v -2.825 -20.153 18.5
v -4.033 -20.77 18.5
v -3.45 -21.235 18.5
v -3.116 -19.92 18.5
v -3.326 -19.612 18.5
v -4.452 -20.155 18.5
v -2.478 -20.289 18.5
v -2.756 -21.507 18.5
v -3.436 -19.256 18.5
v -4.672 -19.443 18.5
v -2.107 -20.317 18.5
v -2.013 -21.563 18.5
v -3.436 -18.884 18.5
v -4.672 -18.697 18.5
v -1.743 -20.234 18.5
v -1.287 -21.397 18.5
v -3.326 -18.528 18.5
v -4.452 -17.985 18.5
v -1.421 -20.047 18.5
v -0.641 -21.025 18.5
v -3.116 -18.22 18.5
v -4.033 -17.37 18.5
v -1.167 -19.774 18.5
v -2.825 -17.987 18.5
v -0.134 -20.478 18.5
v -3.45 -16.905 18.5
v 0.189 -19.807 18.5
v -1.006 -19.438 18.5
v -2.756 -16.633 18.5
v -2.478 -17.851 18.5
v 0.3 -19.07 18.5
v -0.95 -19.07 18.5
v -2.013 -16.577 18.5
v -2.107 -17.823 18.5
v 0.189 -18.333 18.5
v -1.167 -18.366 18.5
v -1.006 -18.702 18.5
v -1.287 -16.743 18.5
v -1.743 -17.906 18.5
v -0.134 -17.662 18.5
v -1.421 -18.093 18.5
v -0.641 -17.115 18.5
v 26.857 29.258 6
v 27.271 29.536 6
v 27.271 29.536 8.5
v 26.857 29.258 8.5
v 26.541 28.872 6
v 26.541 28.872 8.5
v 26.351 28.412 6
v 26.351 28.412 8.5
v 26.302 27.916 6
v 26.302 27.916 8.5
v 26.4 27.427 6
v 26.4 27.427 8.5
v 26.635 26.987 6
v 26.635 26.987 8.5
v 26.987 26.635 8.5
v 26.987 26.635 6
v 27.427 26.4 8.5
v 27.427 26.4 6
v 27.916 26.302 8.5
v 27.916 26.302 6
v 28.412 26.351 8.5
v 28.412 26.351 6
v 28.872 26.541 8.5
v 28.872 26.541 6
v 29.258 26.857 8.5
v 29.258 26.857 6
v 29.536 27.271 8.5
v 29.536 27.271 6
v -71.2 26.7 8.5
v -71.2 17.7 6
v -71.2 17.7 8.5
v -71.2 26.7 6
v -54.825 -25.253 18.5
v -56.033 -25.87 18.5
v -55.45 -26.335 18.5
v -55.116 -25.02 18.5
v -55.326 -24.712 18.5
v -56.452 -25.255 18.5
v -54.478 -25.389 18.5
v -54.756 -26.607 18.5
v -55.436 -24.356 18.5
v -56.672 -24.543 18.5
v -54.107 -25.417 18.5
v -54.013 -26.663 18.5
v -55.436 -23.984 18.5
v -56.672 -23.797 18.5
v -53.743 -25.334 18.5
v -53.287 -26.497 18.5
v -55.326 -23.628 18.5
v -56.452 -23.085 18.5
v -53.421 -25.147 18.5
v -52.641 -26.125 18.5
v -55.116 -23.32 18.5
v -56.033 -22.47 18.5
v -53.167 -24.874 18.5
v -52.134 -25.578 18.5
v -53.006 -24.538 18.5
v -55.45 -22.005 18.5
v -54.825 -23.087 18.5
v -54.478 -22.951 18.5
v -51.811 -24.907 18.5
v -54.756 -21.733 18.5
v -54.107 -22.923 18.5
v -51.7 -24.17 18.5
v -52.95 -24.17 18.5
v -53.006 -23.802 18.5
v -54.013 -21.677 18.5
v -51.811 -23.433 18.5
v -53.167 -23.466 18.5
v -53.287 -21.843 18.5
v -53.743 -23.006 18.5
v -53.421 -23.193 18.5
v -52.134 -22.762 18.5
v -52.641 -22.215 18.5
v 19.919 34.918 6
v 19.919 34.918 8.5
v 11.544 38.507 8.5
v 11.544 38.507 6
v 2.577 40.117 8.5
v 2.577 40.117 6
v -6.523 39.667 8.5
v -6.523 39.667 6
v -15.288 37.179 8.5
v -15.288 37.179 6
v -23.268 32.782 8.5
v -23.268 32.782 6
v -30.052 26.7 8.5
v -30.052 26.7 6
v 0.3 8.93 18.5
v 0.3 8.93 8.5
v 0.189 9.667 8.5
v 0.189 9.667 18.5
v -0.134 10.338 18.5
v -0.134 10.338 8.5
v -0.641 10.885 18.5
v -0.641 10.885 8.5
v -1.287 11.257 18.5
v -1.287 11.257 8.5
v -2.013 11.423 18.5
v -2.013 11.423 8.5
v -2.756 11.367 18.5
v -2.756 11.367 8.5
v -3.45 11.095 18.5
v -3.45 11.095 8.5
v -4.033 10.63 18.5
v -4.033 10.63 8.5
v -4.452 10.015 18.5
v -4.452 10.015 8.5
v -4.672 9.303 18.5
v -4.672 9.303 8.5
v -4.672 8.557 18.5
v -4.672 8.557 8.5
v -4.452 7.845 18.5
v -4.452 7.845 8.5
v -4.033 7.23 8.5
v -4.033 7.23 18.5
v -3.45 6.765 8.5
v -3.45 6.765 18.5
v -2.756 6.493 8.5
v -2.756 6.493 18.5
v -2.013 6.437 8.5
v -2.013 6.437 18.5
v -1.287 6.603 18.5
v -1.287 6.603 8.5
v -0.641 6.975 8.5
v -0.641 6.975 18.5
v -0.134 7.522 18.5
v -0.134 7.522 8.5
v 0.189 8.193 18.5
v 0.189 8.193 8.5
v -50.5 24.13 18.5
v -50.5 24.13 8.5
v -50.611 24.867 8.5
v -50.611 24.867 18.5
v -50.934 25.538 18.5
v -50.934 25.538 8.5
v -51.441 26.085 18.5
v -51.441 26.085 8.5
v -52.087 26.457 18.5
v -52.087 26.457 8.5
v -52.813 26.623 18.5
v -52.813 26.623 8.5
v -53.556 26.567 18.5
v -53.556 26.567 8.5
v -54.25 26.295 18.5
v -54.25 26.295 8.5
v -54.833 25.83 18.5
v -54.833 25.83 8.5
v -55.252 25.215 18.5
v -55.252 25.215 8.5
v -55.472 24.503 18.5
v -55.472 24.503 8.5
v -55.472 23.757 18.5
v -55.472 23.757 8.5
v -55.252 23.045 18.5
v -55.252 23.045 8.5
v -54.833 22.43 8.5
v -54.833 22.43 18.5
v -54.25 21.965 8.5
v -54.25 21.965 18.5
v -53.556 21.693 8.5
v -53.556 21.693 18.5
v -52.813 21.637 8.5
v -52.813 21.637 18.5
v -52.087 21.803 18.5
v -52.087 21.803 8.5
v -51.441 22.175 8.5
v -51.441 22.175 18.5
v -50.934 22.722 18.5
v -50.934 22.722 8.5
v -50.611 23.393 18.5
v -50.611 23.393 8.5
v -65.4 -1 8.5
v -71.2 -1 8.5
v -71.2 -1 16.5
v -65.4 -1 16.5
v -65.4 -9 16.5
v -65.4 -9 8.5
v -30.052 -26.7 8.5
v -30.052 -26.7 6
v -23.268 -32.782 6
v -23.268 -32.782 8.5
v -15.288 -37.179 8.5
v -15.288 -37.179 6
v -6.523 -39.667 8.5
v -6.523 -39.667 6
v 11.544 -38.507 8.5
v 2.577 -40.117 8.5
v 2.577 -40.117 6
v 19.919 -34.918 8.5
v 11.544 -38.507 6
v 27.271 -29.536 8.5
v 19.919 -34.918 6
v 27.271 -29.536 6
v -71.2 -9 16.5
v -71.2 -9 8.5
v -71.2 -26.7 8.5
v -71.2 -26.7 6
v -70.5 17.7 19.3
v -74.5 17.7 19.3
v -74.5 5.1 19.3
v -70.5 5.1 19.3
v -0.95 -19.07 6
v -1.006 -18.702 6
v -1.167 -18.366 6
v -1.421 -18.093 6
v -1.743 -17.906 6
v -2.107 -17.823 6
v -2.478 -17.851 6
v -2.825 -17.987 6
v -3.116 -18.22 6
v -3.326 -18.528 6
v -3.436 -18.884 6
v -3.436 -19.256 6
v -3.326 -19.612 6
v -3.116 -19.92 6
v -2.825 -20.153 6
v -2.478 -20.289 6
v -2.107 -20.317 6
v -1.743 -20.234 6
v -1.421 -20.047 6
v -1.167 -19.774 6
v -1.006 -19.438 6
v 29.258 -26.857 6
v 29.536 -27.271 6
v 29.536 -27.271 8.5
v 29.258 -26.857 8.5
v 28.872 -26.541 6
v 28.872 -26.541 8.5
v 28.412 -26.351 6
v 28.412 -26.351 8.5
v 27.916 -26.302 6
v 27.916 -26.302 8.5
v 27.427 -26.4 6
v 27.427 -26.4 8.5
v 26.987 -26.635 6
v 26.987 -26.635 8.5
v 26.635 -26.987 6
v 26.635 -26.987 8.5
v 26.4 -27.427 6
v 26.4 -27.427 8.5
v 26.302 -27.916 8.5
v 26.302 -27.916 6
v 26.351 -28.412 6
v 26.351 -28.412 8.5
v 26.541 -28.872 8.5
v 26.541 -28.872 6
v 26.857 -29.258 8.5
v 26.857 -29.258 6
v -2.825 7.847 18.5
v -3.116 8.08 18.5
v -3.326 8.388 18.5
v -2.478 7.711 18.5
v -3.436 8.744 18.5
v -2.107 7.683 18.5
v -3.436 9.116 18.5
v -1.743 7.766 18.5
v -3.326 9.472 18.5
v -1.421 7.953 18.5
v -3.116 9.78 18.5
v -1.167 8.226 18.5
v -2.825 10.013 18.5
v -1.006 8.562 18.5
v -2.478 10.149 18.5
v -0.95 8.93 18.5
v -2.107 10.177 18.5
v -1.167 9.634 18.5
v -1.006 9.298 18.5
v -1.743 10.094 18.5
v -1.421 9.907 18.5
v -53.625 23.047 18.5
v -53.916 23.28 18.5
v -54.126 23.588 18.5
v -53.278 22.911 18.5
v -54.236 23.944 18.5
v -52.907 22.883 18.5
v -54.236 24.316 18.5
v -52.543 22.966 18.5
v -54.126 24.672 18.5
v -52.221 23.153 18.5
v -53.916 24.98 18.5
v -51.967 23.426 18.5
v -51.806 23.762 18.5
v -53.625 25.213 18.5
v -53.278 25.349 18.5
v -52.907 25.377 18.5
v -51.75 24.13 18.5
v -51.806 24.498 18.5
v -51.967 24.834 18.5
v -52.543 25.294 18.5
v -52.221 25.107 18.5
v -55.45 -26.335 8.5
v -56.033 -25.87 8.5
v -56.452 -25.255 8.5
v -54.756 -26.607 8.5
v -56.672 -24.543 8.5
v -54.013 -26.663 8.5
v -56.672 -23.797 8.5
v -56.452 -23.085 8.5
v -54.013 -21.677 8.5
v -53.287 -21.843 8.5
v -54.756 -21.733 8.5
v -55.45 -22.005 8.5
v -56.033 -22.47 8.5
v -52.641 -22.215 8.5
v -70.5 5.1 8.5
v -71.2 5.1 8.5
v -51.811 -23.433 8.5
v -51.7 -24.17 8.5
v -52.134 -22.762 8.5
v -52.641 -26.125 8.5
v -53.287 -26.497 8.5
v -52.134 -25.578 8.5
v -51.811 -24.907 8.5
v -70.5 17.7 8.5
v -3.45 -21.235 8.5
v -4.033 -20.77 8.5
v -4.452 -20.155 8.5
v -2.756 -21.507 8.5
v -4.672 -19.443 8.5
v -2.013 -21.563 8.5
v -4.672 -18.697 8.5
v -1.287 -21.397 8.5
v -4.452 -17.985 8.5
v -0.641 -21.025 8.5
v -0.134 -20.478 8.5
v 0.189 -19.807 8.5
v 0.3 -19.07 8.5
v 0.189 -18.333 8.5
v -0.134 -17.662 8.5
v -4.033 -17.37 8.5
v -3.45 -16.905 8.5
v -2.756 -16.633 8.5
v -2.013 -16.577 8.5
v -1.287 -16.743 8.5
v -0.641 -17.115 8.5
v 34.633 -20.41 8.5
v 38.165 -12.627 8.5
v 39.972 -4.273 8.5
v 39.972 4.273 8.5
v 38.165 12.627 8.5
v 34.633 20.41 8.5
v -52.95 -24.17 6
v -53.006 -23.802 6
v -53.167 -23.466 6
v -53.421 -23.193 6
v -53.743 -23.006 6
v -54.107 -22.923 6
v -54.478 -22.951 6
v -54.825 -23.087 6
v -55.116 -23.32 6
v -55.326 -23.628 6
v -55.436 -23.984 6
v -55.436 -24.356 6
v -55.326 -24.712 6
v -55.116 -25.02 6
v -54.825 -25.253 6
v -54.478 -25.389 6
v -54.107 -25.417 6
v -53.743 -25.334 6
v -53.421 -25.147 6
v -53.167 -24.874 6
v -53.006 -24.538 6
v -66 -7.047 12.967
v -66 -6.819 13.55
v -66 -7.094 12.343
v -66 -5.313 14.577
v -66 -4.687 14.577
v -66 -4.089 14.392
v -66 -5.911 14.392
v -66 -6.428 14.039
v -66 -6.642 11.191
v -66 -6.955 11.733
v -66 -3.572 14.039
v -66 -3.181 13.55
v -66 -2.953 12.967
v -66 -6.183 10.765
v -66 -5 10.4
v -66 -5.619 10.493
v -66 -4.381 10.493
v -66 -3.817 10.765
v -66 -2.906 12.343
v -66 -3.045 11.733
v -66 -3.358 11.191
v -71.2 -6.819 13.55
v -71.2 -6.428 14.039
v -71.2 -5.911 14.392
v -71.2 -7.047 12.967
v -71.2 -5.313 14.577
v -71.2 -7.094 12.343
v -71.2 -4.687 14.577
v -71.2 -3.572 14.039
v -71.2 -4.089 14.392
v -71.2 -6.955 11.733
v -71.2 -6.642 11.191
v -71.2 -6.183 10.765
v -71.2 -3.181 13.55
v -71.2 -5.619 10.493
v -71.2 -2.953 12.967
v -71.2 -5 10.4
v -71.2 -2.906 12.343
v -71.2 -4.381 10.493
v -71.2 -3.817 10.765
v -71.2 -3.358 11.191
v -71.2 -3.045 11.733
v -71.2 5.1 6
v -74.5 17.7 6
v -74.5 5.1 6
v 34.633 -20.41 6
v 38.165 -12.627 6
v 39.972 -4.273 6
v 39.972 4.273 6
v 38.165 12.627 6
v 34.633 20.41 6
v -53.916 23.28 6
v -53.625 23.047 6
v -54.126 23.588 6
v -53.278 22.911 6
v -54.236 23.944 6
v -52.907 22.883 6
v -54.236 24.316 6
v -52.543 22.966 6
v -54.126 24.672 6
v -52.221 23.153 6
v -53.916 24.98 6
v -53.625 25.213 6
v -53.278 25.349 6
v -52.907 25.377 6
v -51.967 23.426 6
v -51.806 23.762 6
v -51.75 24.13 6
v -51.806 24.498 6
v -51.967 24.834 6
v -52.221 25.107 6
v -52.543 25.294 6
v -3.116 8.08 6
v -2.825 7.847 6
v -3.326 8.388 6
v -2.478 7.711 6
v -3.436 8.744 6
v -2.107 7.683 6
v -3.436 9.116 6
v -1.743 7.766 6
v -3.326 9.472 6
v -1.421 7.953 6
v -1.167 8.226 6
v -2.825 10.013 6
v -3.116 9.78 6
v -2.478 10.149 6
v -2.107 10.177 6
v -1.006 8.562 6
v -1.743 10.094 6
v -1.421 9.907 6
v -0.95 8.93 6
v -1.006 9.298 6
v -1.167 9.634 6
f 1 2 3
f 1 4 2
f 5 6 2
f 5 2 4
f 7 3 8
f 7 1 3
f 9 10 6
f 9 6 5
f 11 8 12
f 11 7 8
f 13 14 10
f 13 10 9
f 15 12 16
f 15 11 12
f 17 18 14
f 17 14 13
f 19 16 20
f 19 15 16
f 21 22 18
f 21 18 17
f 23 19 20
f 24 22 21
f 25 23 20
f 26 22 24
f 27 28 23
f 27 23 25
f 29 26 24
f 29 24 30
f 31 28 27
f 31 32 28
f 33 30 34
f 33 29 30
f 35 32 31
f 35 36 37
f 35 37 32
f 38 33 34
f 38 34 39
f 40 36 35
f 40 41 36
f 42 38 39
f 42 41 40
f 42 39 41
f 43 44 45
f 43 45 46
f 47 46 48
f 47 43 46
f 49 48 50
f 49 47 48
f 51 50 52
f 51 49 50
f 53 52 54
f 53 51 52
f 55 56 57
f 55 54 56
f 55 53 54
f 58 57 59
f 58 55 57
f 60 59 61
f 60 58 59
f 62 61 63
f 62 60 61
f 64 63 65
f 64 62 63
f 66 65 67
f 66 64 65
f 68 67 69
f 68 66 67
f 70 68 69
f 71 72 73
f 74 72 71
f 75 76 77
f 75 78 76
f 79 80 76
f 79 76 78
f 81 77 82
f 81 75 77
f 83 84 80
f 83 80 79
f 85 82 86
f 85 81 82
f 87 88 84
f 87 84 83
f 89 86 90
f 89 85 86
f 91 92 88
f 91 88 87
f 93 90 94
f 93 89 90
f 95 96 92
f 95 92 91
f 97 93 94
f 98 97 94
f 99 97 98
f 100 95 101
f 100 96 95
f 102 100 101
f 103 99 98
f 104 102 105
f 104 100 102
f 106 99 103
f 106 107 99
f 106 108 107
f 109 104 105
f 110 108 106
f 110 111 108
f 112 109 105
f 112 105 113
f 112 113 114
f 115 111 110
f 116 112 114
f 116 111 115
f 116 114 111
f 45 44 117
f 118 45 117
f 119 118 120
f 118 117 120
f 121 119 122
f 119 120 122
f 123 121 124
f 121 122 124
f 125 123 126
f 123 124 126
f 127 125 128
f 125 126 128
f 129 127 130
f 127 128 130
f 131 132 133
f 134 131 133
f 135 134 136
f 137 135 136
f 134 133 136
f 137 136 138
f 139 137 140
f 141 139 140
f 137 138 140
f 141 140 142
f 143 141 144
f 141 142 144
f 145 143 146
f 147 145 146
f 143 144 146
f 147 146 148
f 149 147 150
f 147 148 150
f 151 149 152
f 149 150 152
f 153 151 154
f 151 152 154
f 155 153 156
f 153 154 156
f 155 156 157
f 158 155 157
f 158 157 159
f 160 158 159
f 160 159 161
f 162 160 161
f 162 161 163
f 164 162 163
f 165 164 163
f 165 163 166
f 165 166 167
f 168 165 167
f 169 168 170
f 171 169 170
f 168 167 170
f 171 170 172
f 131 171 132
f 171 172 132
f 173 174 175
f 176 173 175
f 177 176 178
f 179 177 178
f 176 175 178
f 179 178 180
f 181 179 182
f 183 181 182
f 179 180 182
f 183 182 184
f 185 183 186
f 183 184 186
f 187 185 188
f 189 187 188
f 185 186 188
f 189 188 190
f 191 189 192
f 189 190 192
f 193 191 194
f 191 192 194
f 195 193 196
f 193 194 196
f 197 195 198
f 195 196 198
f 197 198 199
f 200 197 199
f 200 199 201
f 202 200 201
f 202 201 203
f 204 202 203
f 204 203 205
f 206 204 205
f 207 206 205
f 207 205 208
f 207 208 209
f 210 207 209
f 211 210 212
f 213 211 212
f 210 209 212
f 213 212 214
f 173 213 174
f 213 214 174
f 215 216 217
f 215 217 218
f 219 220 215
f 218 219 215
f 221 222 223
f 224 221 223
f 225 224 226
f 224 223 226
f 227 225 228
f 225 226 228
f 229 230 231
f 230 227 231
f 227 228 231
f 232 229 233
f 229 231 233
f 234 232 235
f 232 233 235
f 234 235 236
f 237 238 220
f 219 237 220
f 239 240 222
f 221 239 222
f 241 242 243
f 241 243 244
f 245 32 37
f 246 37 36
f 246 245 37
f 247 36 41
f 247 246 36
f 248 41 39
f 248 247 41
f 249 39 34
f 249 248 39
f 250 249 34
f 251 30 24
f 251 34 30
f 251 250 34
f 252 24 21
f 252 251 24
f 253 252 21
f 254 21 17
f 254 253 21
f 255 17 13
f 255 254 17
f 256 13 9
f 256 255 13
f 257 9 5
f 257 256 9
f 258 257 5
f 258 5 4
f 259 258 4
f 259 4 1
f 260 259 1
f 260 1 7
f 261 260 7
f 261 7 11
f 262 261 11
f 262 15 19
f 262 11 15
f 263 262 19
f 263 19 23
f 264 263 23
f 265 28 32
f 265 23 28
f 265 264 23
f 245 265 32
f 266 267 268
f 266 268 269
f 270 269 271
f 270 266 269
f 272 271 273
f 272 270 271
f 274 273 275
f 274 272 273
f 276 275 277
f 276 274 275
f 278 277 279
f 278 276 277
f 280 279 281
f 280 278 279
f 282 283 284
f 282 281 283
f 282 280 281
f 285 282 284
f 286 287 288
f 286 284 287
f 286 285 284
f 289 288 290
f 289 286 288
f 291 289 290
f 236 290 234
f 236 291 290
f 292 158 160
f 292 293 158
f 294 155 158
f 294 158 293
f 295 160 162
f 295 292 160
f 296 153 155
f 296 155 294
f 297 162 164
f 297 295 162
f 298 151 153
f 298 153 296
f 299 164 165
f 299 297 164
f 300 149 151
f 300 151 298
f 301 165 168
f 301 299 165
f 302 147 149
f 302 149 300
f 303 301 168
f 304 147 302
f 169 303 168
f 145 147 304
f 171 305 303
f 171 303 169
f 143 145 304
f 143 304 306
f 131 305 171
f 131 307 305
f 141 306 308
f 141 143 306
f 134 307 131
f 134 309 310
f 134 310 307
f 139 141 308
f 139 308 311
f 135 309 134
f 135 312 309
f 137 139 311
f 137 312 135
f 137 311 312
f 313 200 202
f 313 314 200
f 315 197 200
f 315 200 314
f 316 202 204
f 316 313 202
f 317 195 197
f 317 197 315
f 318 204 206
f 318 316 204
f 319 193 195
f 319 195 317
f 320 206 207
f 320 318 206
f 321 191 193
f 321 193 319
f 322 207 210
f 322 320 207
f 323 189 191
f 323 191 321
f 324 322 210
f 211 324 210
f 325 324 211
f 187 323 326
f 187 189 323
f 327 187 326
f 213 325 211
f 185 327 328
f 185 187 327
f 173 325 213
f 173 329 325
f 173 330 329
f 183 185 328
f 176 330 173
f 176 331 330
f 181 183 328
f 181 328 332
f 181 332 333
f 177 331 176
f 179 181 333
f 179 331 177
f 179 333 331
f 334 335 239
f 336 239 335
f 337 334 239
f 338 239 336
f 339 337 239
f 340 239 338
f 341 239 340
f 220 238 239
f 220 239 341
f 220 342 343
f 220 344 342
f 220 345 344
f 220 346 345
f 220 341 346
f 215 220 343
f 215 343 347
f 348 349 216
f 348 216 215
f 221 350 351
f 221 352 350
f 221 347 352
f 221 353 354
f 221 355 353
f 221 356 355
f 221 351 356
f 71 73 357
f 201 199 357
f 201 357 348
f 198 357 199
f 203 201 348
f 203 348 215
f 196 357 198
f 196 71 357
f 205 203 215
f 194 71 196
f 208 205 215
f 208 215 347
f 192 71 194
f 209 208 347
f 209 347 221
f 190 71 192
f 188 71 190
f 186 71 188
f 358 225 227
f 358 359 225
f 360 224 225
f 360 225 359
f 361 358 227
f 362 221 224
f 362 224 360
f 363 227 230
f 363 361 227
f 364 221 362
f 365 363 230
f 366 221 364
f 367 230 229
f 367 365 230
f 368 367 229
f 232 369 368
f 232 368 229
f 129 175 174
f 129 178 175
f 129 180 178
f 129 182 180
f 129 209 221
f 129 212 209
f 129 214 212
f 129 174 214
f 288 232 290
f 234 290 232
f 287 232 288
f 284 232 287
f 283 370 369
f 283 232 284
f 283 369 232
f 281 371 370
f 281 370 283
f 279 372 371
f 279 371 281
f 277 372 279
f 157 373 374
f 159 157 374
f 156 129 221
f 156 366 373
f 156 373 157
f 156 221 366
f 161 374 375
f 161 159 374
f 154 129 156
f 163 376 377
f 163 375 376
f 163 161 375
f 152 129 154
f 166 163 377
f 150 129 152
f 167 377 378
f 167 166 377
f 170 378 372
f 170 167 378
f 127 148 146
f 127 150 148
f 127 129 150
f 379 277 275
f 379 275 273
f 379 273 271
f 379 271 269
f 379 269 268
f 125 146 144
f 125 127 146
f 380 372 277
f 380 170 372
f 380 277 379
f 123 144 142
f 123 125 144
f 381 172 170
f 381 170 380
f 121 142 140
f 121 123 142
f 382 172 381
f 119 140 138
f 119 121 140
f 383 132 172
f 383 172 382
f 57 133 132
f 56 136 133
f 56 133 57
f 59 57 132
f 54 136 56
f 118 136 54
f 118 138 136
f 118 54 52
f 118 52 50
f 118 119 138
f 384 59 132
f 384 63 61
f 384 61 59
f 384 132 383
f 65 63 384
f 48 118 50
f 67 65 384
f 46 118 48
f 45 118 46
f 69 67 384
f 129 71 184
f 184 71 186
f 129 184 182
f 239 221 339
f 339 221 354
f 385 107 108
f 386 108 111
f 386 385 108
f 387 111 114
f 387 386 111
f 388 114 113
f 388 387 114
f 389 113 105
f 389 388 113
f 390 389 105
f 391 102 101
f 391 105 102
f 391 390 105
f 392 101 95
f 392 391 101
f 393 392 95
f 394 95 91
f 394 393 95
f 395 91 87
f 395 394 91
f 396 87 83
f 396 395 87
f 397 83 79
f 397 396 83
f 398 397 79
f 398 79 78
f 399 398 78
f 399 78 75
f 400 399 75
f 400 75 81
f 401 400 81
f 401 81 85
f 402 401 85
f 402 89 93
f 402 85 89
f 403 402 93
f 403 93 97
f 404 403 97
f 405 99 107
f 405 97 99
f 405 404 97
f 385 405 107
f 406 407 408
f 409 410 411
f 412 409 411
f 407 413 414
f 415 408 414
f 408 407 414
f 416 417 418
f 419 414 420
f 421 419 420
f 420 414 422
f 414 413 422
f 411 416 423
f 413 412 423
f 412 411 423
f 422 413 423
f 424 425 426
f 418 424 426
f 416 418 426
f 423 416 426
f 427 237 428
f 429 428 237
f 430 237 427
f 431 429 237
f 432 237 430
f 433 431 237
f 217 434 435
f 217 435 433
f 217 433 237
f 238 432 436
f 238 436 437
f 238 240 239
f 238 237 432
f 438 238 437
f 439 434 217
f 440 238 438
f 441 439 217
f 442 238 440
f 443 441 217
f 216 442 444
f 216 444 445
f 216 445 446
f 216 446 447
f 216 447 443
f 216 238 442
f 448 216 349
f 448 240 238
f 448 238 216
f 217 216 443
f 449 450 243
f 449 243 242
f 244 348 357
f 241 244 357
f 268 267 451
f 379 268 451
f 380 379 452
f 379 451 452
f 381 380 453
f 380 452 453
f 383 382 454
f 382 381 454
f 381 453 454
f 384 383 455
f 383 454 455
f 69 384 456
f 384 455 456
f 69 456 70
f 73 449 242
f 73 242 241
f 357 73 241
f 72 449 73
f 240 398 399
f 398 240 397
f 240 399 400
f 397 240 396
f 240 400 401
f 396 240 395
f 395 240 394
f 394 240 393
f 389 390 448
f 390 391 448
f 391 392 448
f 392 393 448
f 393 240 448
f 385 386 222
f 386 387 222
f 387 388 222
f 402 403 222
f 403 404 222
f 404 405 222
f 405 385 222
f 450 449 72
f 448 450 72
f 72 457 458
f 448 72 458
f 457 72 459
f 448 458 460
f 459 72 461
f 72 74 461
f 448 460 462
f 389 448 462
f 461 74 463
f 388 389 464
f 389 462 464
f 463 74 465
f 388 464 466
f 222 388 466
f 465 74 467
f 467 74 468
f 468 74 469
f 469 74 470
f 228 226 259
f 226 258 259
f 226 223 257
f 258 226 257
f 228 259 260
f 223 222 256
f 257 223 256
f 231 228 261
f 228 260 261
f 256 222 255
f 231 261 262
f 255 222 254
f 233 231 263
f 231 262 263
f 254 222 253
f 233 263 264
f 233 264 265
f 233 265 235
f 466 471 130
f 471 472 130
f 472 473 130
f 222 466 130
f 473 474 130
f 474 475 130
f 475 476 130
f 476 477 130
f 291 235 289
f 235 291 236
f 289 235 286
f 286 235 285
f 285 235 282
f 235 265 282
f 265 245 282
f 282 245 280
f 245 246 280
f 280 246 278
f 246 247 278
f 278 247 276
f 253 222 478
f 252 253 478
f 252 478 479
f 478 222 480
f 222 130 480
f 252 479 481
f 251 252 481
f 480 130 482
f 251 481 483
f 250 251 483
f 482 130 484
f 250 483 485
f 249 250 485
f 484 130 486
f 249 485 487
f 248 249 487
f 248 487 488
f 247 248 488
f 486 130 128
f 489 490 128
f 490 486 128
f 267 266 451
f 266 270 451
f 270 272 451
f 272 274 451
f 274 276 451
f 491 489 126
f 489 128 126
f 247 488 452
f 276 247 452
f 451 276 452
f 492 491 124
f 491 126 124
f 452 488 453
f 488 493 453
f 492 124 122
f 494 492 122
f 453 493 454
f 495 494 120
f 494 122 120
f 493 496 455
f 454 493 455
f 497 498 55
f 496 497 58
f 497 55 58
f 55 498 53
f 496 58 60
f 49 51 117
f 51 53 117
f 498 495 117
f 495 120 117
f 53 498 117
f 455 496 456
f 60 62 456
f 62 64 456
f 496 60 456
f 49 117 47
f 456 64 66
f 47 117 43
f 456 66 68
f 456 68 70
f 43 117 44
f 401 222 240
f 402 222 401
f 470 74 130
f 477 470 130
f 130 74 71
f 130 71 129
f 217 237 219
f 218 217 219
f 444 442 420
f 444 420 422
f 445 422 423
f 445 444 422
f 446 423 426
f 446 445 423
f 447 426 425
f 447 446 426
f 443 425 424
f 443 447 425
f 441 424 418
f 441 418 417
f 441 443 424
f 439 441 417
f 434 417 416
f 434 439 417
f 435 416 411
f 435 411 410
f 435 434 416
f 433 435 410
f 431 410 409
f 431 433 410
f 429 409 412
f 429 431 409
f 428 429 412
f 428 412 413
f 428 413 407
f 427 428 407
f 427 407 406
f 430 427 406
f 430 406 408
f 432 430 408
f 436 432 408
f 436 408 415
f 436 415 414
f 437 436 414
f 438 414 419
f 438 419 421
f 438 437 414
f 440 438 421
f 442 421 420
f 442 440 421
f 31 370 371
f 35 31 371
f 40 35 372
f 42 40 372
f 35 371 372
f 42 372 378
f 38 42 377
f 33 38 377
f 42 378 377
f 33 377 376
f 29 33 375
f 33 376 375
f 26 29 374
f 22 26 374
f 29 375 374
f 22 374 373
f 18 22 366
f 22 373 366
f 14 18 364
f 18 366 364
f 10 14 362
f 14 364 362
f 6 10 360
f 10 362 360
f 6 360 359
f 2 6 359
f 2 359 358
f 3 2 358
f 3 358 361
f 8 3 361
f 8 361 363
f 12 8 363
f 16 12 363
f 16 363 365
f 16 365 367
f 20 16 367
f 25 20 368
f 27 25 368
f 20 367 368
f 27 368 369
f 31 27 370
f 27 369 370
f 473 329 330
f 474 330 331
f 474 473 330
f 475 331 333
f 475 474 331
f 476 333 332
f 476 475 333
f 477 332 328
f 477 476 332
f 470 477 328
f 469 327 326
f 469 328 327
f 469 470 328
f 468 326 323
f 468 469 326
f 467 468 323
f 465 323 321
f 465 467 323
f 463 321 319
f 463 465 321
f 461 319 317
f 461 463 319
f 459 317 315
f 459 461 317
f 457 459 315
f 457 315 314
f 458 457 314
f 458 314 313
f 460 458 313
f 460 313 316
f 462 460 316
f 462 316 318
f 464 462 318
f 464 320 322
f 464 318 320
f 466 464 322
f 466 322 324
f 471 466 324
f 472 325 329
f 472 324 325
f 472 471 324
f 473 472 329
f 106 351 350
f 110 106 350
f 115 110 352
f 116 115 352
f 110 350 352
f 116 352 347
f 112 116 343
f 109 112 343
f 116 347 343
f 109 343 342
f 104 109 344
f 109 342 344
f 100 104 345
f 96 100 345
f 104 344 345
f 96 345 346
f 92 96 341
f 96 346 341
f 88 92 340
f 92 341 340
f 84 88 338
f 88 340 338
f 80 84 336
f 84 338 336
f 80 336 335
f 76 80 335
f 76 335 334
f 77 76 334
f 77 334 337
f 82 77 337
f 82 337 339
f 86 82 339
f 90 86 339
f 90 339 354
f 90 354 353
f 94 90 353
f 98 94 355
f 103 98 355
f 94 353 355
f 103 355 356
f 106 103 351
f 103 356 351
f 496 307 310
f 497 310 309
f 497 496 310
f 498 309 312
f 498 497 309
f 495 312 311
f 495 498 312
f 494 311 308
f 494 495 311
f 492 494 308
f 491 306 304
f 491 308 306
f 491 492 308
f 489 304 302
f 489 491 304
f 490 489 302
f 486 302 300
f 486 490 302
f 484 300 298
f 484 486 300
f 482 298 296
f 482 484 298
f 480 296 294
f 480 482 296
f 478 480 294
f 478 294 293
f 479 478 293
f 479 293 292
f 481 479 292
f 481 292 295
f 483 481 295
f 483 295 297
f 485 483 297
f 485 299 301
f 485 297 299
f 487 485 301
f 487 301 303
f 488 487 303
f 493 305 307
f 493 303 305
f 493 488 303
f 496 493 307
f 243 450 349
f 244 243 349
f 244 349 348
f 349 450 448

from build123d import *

# Parameters (mm, degrees)
SKETCH2_W           = 51.2
SKETCH2_H           = 53.4
BOSS_EXTRUDE2_DEPTH = 2.5
SKETCH3_R           = 40.2
BOSS_EXTRUDE3_DEPTH = 2.5
SKETCH4_R           = 2.5
BOSS_EXTRUDE4_DEPTH = 10
SKETCH5_W           = 5.8
SKETCH5_H           = 8
BOSS_EXTRUDE5_DEPTH = 8
SKETCH6_R           = 1.25
SKETCH6_R_2         = 1.7
CUT_EXTRUDE1_DEPTH  = 83.714750801
SKETCH7_R           = 2.1
CUT_EXTRUDE2_DEPTH  = 5.2
SKETCH8_W           = 4
SKETCH8_H           = 12.6
BOSS_EXTRUDE6_DEPTH = 13.3


with BuildPart() as part:
    # Sketch2 → Boss-Extrude2 (new body)
    with BuildSketch(Plane.XY.offset(6)):
        with Locations((-45.6, 0)):
            Rectangle(SKETCH2_W, SKETCH2_H)
    extrude(amount=BOSS_EXTRUDE2_DEPTH)

    # Sketch3 → Boss-Extrude3 (add)
    with BuildSketch(Plane.XY.offset(6)):
        Circle(SKETCH3_R)
    extrude(amount=BOSS_EXTRUDE3_DEPTH)

    # Sketch4 → Boss-Extrude4 (add)
    with BuildSketch(Plane.XY.offset(8.5)):
        with Locations((-54.2, -24.17)):
            Circle(SKETCH4_R)
        with Locations((-53, 24.13)):
            Circle(SKETCH4_R)
        with Locations((-2.2, -19.07)):
            Circle(SKETCH4_R)
        with Locations((-2.2, 8.93)):
            Circle(SKETCH4_R)
    extrude(amount=BOSS_EXTRUDE4_DEPTH)

    # Sketch5 → Boss-Extrude5 (add)
    with BuildSketch(Plane.XY.offset(8.5)):
        with Locations((-68.3, -5)):
            Rectangle(SKETCH5_W, SKETCH5_H)
    extrude(amount=BOSS_EXTRUDE5_DEPTH)

    # Sketch6 → Cut-Extrude1 (cut, through all)
    with BuildSketch(Plane.XY.offset(6)):
        with Locations((-54.2, -24.17)):
            Circle(SKETCH6_R)
        with Locations((-53, 24.13)):
            Circle(SKETCH6_R)
        with Locations((-2.2, -19.07)):
            Circle(SKETCH6_R)
        with Locations((-2.2, 8.93)):
            Circle(SKETCH6_R)
        with Locations((28, 28)):
            Circle(SKETCH6_R_2)
        with Locations((28, -28)):
            Circle(SKETCH6_R_2)
    extrude(amount=CUT_EXTRUDE1_DEPTH, mode=Mode.SUBTRACT)

    # Sketch7 → Cut-Extrude2 (cut)
    with BuildSketch(Plane(origin=(-71.2, 0, 0), x_dir=(0, 0, -1), z_dir=(1, 0, 0))):
        with Locations((-12.5, -5)):
            Circle(SKETCH7_R)
    extrude(amount=CUT_EXTRUDE2_DEPTH, mode=Mode.SUBTRACT)

    # Sketch8 → Boss-Extrude6 (add)
    with BuildSketch(Plane.XY.offset(6)):
        with Locations((-72.5, 11.4)):
            Rectangle(SKETCH8_W, SKETCH8_H)
    extrude(amount=BOSS_EXTRUDE6_DEPTH)


solid = part.part
